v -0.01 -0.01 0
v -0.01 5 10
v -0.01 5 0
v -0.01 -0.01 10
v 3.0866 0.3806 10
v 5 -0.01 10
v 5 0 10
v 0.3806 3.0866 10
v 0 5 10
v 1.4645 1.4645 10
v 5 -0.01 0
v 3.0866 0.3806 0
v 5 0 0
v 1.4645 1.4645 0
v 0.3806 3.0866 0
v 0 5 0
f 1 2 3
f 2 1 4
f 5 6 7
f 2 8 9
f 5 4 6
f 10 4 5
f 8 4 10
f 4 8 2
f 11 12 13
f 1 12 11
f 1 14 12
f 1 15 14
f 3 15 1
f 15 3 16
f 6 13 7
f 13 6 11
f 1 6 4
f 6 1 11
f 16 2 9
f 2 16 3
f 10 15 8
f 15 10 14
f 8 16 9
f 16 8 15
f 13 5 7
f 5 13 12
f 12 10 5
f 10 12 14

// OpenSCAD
/*
 *    OpenScad functions to fillet
 *
 *    Copyright (C) 2016 Felipe Machado
 *    Universidad Rey Juan Carlos, Spain
 *    https://github.com/felipe-m
 *    License: LGPL 3.0 or later
 *
 *    to use this functions include in your file:
 * use <fillet.scad>
 *    if not in the same directory:
 * use <PATH_TO/fillet.scad>
 *    dont use 'include' instead of 'use' so you dont get the objects
 *    created in this file
*/


r_fillet = 5;
h_fillet = 10;

// adding 0.1mm to avoid non manifold corners when adding fillets and chamfers
nmf_add = 0.01;

// Having non-manifold problems with fillet_add, making it a little larger

// fillet: to substract, so we have to make it larger

module base_fillet_dif (r, h, fillet)
{  
  
  if (fillet==1) 
  {    
    difference ()
    {
     // -1, -2 y 2, 4 is to make the difference
     translate([0,0,-1])cube([r+1,r+1,h+2]);
     translate([0,0,-2])cylinder(r=r, h=h+4);
     //translate([0,0,-2])cylinder(r=r, h=h+4, $fa=1, $fs=0.5);
    }
  } else { // chamfer
    difference ()
    {
      translate([0,0,-1])cube([r+1,r+1,h+2]);
      // The cube has the vertexs on the X Y axis, so the difference
      // is done apropiately. 
      translate([0,0,-2])cylinder(r=r, h=h+4, $fn=4);
    }
  }
      
}

//*base_fillet_dif (r=r_fillet, h=h_fillet, fillet=1);
//*base_fillet_dif (r=r_fillet, h=h_fillet, fillet=0);


// ---------------------- FILLET_DIF -------------------------
// Makes a fillet in a vertical line used for difference
// It is bigger to be used for the difference
// So the dimensions are the dimensions of the fillet, 
// YOU DON'T HAVE TO MAKE IT LARGER to consider the difference
//   (to avoid non-manifold)
// r: Radius of the fillet
// h: Height of the fillet
// --------- taken away
// // x: position of the fillet (lowest X point)
// // Y: position of the fillet (lowest Y point)
// ----------------------
// xdir: x direction of the fillet. Values: 1, -1
// ydir: y direction of the fillet. Values: 1, -1
//
//                   Y
//            _      |     _
//   x=-1   /        |       \  x=1, y=1
//   y= 1   |        |       |
//                   |
//         -------------------> X +
//                   |        
//   x=-1   |        |       |   x=1
//   y=-1    \_      |    _ /    y=-1
//                   |
// fillet: fillet or chamfer
//         1: fillet
//         0: chamfer



//module fillet_dif_z (r, h, x, y, xdir, ydir, fillet)


module fillet_dif_z (r, h, xdir, ydir, fillet)
{
// This is what we want to do:    
//    if ((xdir == 1) && (ydir == 1)) {
//      rotation = 0;
//    } else if ((xdir == -1) && (ydir == 1)) {
//      rotation = 90;  
//    } else if ((xdir == -1) && (ydir == -1)) {
//      rotation = 180;
//    } else if ((xdir ==  1) && (ydir == -1)) {
//      rotation = 270;
//    } else {
//      echo ("Error: incorrect values for xdir, ydir");
//    }
// But since it is not possible in oscad, we do this way:
    // atan gives 45 when xdir== 1 and ydir== 1 
    //                 or xdir==-1 and ydir==-1
    // so we make it 0
    //
    // atan gives -45 when xdir==-1 and ydir== 1 
    //                  or xdir== 1 and ydir==-1
    // so whe make it -90 (270)
    //
    angle_aux =  atan (ydir/xdir) - 45;
    //echo ("angle: ", angle_aux);
     
    // when xdir == -1 we add 180, making:
    // from 0 of (xdir==-1 and ydir==-1) to 180
    // from -90 of (xdir==-1 and ydir== 1) to 90
    rotation = (xdir == 1) ? angle_aux : angle_aux + 180;
        
    //echo ("rotation: ", rotation);
    
    //translate([x,y,0]) // required translation
    translate([-xdir*r, -ydir*r,0])  // to have it in 0,0
      rotate ([0,0,rotation])
      base_fillet_dif (r=r, h=h, fillet=fillet);
}
    

//fillet_dif_z (r=r_fillet, h=h_fillet, xdir=1, ydir=1, fillet=1);
//fillet_dif_z (r=r_fillet, h=h_fillet, xdir=-1, ydir=1, fillet=1);
//fillet_dif_z (r=r_fillet, h=h_fillet, xdir=1, ydir=-1, fillet=1);
//fillet_dif_z (r=r_fillet, h=h_fillet, xdir=-1, ydir=-1, fillet=1);


// see the explanation on filled_add_x
module fillet_dif_x (r, h, ydir, zdir, fillet)
{
      if ((ydir == 1) && (zdir == 1)) {
      rotate ([0,90,0])
        fillet_dif_z (r=r, h=h, xdir=-1, ydir=1, fillet=fillet);
    } else if ((ydir == -1) && (zdir == 1)) {
      rotate ([0,90,0])
         fillet_dif_z (r=r, h=h, xdir=-1, ydir=-1, fillet=fillet);
    } else if ((ydir == 1) && (zdir == -1)) {
       rotate ([0,90,0])
       fillet_dif_z (r=r, h=h, xdir=1, ydir=1, fillet=fillet);
    } else if ((ydir == -1) && (zdir == -1)) {
       rotate ([0,90,0])
       fillet_dif_z (r=r, h=h, xdir=1, ydir=-1, fillet=fillet);
    } else {
        echo ("wrong ydir, zdir");
    }
}
    
//fillet_dif_x (r=r_fillet, h=h_fillet, ydir=-1, zdir=-1, fillet=1);

module fillet_dif_y (r, h, xdir, zdir, fillet)
{
       if ((xdir == 1) && (zdir == 1)) {
      rotate ([-90,0,0])
        fillet_dif_z (r=r, h=h, xdir=1, ydir=-1, fillet=fillet);
    } else if ((xdir == -1) && (zdir == 1)) {
      rotate ([-90,0,0])
         fillet_dif_z (r=r, h=h, xdir=-1, ydir=-1, fillet=fillet);
    } else if ((xdir == 1) && (zdir == -1)) {
       rotate ([-90,0,0])
       fillet_dif_z (r=r, h=h, xdir=1, ydir=1, fillet=fillet);
    } else if ((xdir == -1) && (zdir == -1)) {
       rotate ([-90,0,0])
       fillet_dif_z (r=r, h=h, xdir=-1, ydir=1, fillet=fillet);
    } else {
        echo ("wrong xdir, zdir");
    }
}

//fillet_dif_y (r=r_fillet, h=h_fillet, xdir=-1, zdir=-1, fillet=1);
//fillet_dif_y (r=r_fillet, h=h_fillet, xdir=1, zdir=1, fillet=1);

// ---------- chamfer to add, so no need to add milimitre to avoid nonmanifold

diagonal = 4;
largo = 50;

module chamfer_hal (diagonal, largo) 
{
    difference () {
        cube ([diagonal, largo, diagonal]);
        // le pongo 2*diagonal, para no estar con cuadrados y raices
        if (diagonal < 3) {
          translate([-1,-1, diagonal+1]) rotate ([0,45,0]) cube ([4*diagonal, largo+2, 4*diagonal]);
        } else {
          translate([-1,-1, diagonal+1]) rotate ([0,45,0]) cube ([2*diagonal, largo+2, 2*diagonal]);
        }  
    }
}

*chamfer_hal(diagonal=diagonal, largo=largo);

module base_fillet_add (r, h, fillet)
{  
  
  if (fillet==1) 
  {    
    difference ()
    {

     cube([r+nmf_add,r+nmf_add,h]);
     translate([0,0,-1])cylinder(r=r, h=h+2);
     //translate([0,0,-1])cylinder(r=r, h=h+2, $fa=1, $fs=0.5);
    }
  } else { // chamfer
    difference ()
    {
      cube([r+nmf_add,r+nmf_add,h]);
      translate([0,0,-1])cylinder(r=r, h=h+2, $fn=4);
    }
  }
      
}

//base_fillet_add (r=r_fillet, h=h_fillet, fillet=1);
*base_fillet_add (r=r_fillet, h=h_fillet, fillet=0);

// ------------------------ fillet_add_z ------------------------
// adds a vertical fillet
// Makes a fillet in a vertical line used for union difference
// r: Radius of the fillet
// h: Height of the fillet
// ---------- taken out
// //  x: position of the fillet (lowest X point)
// //  Y: position of the fillet (lowest Y point)
// ---------------
// xdir: x direction of the fillet. Values: 1, -1
// ydir: y direction of the fillet. Values: 1, -1
//
//                   Y
//                   |    
//   x=-1        |   |   |      x=1, y=1
//   y= 1      _ /   |   \_    
//                   |
//         -------------------> X +
//             _     |    _     
//   x=-1        \   |   /         x=1
//   y=-1        |   |   |      y=-1
//                   |
// fillet: fillet or chamfer
//         1: fillet
//         0: chamfer


//module fillet_add_z (r, h, x, y, xdir, ydir, fillet)

module fillet_add_z (r, h, xdir, ydir, fillet)
{
// This is what we want to do:    
//    if ((xdir == 1) && (ydir == 1)) {
//      rotation = 180;
//    } else if ((xdir == -1) && (ydir == 1)) {
//      rotation = 270;  
//    } else if ((xdir == -1) && (ydir == -1)) {
//      rotation = 0;
//    } else if ((xdir ==  1) && (ydir == -1)) {
//      rotation = 90;
//    } else {
//      echo ("Error: incorrect values for xdir, ydir");
//    }
// But since it is not possible in oscad, we do this way:
    // atan gives 45 when xdir== 1 and ydir== 1 
    //                 or xdir==-1 and ydir==-1
    // so we make it 0
    //
    // atan gives -45 when xdir==-1 and ydir== 1 
    //                  or xdir== 1 and ydir==-1
    // so whe make it -90 (270)
    //
    angle_aux =  atan (ydir/xdir) - 45;
    //echo ("angle: ", angle_aux);
     
    // when xdir == 1 we add 180, making:
    // from 0 of (xdir==1 and ydir==1) to 180
    // from -90 of (xdir==1 and ydir== -1) to 90
    rotation = (xdir == 1) ? angle_aux +180 : angle_aux;
        
    //echo ("rotation: ", rotation);
    
    //translate([x,y,0]) // required translation
      translate([xdir*r, ydir*r,0])  // to have it in 0,0
      rotate ([0,0,rotation])
      base_fillet_add (r=r, h=h, fillet=fillet);
}
    
fillet_add_z (r=r_fillet, h=h_fillet, xdir=1, ydir=1, fillet=1);
//fillet_add_z (r=r_fillet, h=h_fillet, xdir=-1, ydir=1, fillet=0);
//%fillet_add_z (r=r_fillet, h=h_fillet, xdir=1, ydir=-1, fillet=1);
//#fillet_add_z (r=r_fillet, h=h_fillet, xdir=-1, ydir=-1, fillet=1);

// ----------------------------- fillet_add_x -----------------
// adds a fillet on the X axis (laying down).
// It will be on the origin. 
// translate it to move it. Place it on the lowest X point

//
//                   Z
//                   |    
//   y=-1        |   |   |      y=1, z=1
//   z= 1      _ /   |   \_    
//                   |
//         -------------------> Y +
//             _     |    _     
//   y=-1        \   |   /      y=1
//   z=-1        |   |   |      z=-1
//                   |
// fillet: fillet or chamfer
//         1: fillet
//         0: chamfer


module fillet_add_x (r, h, ydir, zdir, fillet)
{
    if ((ydir == 1) && (zdir == 1)) {
      rotate ([0,90,0])
        fillet_add_z (r=r, h=h, xdir=-1, ydir=1, fillet=fillet);
    } else if ((ydir == -1) && (zdir == 1)) {
      rotate ([0,90,0])
         fillet_add_z (r=r, h=h, xdir=-1, ydir=-1, fillet=fillet);
    } else if ((ydir == 1) && (zdir == -1)) {
       rotate ([0,90,0])
       fillet_add_z (r=r, h=h, xdir=1, ydir=1, fillet=fillet);
    } else if ((ydir == -1) && (zdir == -1)) {
       rotate ([0,90,0])
       fillet_add_z (r=r, h=h, xdir=1, ydir=-1, fillet=fillet);
    } else {
        echo ("wrong ydir, zdir");
    }
}

//fillet_add_x (r=r_fillet, h=h_fillet, ydir=1, zdir=-1, fillet=1);


// ----------------------------- fillet_add_y -----------------
// adds a fillet on the Y axis (laying down).
// It will be on the origin. 
// translate it to move it. Place it on the lowest Y point

//
//                   Z
//                   |    
//   x=-1        |   |   |      x=1, z=1
//   z= 1      _ /   |   \_    
//                   |
//         -------------------> X +
//             _     |    _     
//   x=-1        \   |   /      x=1
//   z=-1        |   |   |      z=-1
//                   |
// fillet: fillet or chamfer
//         1: fillet
//         0: chamfer


module fillet_add_y (r, h, xdir, zdir, fillet)
{
    if ((xdir == 1) && (zdir == 1)) {
      rotate ([-90,0,0])
        fillet_add_z (r=r, h=h, xdir=1, ydir=-1, fillet=fillet);
    } else if ((xdir == -1) && (zdir == 1)) {
      rotate ([-90,0,0])
         fillet_add_z (r=r, h=h, xdir=-1, ydir=-1, fillet=fillet);
    } else if ((xdir == 1) && (zdir == -1)) {
       rotate ([-90,0,0])
       fillet_add_z (r=r, h=h, xdir=1, ydir=1, fillet=fillet);
    } else if ((xdir == -1) && (zdir == -1)) {
       rotate ([-90,0,0])
       fillet_add_z (r=r, h=h, xdir=-1, ydir=1, fillet=fillet);
    } else {
        echo ("wrong xdir, zdir");
    }
}


//#fillet_add_y (r=r_fillet, h=h_fillet, xdir=1, zdir=-1, fillet=1);
//fillet_add_y (r=r_fillet, h=h_fillet, xdir=-1, zdir=1, fillet=1);
//%fillet_add_y (r=r_fillet, h=h_fillet, xdir=1, zdir=1, fillet=1);
//fillet_add_y (r=r_fillet, h=h_fillet, xdir=-1, zdir=-1, fillet=1);
